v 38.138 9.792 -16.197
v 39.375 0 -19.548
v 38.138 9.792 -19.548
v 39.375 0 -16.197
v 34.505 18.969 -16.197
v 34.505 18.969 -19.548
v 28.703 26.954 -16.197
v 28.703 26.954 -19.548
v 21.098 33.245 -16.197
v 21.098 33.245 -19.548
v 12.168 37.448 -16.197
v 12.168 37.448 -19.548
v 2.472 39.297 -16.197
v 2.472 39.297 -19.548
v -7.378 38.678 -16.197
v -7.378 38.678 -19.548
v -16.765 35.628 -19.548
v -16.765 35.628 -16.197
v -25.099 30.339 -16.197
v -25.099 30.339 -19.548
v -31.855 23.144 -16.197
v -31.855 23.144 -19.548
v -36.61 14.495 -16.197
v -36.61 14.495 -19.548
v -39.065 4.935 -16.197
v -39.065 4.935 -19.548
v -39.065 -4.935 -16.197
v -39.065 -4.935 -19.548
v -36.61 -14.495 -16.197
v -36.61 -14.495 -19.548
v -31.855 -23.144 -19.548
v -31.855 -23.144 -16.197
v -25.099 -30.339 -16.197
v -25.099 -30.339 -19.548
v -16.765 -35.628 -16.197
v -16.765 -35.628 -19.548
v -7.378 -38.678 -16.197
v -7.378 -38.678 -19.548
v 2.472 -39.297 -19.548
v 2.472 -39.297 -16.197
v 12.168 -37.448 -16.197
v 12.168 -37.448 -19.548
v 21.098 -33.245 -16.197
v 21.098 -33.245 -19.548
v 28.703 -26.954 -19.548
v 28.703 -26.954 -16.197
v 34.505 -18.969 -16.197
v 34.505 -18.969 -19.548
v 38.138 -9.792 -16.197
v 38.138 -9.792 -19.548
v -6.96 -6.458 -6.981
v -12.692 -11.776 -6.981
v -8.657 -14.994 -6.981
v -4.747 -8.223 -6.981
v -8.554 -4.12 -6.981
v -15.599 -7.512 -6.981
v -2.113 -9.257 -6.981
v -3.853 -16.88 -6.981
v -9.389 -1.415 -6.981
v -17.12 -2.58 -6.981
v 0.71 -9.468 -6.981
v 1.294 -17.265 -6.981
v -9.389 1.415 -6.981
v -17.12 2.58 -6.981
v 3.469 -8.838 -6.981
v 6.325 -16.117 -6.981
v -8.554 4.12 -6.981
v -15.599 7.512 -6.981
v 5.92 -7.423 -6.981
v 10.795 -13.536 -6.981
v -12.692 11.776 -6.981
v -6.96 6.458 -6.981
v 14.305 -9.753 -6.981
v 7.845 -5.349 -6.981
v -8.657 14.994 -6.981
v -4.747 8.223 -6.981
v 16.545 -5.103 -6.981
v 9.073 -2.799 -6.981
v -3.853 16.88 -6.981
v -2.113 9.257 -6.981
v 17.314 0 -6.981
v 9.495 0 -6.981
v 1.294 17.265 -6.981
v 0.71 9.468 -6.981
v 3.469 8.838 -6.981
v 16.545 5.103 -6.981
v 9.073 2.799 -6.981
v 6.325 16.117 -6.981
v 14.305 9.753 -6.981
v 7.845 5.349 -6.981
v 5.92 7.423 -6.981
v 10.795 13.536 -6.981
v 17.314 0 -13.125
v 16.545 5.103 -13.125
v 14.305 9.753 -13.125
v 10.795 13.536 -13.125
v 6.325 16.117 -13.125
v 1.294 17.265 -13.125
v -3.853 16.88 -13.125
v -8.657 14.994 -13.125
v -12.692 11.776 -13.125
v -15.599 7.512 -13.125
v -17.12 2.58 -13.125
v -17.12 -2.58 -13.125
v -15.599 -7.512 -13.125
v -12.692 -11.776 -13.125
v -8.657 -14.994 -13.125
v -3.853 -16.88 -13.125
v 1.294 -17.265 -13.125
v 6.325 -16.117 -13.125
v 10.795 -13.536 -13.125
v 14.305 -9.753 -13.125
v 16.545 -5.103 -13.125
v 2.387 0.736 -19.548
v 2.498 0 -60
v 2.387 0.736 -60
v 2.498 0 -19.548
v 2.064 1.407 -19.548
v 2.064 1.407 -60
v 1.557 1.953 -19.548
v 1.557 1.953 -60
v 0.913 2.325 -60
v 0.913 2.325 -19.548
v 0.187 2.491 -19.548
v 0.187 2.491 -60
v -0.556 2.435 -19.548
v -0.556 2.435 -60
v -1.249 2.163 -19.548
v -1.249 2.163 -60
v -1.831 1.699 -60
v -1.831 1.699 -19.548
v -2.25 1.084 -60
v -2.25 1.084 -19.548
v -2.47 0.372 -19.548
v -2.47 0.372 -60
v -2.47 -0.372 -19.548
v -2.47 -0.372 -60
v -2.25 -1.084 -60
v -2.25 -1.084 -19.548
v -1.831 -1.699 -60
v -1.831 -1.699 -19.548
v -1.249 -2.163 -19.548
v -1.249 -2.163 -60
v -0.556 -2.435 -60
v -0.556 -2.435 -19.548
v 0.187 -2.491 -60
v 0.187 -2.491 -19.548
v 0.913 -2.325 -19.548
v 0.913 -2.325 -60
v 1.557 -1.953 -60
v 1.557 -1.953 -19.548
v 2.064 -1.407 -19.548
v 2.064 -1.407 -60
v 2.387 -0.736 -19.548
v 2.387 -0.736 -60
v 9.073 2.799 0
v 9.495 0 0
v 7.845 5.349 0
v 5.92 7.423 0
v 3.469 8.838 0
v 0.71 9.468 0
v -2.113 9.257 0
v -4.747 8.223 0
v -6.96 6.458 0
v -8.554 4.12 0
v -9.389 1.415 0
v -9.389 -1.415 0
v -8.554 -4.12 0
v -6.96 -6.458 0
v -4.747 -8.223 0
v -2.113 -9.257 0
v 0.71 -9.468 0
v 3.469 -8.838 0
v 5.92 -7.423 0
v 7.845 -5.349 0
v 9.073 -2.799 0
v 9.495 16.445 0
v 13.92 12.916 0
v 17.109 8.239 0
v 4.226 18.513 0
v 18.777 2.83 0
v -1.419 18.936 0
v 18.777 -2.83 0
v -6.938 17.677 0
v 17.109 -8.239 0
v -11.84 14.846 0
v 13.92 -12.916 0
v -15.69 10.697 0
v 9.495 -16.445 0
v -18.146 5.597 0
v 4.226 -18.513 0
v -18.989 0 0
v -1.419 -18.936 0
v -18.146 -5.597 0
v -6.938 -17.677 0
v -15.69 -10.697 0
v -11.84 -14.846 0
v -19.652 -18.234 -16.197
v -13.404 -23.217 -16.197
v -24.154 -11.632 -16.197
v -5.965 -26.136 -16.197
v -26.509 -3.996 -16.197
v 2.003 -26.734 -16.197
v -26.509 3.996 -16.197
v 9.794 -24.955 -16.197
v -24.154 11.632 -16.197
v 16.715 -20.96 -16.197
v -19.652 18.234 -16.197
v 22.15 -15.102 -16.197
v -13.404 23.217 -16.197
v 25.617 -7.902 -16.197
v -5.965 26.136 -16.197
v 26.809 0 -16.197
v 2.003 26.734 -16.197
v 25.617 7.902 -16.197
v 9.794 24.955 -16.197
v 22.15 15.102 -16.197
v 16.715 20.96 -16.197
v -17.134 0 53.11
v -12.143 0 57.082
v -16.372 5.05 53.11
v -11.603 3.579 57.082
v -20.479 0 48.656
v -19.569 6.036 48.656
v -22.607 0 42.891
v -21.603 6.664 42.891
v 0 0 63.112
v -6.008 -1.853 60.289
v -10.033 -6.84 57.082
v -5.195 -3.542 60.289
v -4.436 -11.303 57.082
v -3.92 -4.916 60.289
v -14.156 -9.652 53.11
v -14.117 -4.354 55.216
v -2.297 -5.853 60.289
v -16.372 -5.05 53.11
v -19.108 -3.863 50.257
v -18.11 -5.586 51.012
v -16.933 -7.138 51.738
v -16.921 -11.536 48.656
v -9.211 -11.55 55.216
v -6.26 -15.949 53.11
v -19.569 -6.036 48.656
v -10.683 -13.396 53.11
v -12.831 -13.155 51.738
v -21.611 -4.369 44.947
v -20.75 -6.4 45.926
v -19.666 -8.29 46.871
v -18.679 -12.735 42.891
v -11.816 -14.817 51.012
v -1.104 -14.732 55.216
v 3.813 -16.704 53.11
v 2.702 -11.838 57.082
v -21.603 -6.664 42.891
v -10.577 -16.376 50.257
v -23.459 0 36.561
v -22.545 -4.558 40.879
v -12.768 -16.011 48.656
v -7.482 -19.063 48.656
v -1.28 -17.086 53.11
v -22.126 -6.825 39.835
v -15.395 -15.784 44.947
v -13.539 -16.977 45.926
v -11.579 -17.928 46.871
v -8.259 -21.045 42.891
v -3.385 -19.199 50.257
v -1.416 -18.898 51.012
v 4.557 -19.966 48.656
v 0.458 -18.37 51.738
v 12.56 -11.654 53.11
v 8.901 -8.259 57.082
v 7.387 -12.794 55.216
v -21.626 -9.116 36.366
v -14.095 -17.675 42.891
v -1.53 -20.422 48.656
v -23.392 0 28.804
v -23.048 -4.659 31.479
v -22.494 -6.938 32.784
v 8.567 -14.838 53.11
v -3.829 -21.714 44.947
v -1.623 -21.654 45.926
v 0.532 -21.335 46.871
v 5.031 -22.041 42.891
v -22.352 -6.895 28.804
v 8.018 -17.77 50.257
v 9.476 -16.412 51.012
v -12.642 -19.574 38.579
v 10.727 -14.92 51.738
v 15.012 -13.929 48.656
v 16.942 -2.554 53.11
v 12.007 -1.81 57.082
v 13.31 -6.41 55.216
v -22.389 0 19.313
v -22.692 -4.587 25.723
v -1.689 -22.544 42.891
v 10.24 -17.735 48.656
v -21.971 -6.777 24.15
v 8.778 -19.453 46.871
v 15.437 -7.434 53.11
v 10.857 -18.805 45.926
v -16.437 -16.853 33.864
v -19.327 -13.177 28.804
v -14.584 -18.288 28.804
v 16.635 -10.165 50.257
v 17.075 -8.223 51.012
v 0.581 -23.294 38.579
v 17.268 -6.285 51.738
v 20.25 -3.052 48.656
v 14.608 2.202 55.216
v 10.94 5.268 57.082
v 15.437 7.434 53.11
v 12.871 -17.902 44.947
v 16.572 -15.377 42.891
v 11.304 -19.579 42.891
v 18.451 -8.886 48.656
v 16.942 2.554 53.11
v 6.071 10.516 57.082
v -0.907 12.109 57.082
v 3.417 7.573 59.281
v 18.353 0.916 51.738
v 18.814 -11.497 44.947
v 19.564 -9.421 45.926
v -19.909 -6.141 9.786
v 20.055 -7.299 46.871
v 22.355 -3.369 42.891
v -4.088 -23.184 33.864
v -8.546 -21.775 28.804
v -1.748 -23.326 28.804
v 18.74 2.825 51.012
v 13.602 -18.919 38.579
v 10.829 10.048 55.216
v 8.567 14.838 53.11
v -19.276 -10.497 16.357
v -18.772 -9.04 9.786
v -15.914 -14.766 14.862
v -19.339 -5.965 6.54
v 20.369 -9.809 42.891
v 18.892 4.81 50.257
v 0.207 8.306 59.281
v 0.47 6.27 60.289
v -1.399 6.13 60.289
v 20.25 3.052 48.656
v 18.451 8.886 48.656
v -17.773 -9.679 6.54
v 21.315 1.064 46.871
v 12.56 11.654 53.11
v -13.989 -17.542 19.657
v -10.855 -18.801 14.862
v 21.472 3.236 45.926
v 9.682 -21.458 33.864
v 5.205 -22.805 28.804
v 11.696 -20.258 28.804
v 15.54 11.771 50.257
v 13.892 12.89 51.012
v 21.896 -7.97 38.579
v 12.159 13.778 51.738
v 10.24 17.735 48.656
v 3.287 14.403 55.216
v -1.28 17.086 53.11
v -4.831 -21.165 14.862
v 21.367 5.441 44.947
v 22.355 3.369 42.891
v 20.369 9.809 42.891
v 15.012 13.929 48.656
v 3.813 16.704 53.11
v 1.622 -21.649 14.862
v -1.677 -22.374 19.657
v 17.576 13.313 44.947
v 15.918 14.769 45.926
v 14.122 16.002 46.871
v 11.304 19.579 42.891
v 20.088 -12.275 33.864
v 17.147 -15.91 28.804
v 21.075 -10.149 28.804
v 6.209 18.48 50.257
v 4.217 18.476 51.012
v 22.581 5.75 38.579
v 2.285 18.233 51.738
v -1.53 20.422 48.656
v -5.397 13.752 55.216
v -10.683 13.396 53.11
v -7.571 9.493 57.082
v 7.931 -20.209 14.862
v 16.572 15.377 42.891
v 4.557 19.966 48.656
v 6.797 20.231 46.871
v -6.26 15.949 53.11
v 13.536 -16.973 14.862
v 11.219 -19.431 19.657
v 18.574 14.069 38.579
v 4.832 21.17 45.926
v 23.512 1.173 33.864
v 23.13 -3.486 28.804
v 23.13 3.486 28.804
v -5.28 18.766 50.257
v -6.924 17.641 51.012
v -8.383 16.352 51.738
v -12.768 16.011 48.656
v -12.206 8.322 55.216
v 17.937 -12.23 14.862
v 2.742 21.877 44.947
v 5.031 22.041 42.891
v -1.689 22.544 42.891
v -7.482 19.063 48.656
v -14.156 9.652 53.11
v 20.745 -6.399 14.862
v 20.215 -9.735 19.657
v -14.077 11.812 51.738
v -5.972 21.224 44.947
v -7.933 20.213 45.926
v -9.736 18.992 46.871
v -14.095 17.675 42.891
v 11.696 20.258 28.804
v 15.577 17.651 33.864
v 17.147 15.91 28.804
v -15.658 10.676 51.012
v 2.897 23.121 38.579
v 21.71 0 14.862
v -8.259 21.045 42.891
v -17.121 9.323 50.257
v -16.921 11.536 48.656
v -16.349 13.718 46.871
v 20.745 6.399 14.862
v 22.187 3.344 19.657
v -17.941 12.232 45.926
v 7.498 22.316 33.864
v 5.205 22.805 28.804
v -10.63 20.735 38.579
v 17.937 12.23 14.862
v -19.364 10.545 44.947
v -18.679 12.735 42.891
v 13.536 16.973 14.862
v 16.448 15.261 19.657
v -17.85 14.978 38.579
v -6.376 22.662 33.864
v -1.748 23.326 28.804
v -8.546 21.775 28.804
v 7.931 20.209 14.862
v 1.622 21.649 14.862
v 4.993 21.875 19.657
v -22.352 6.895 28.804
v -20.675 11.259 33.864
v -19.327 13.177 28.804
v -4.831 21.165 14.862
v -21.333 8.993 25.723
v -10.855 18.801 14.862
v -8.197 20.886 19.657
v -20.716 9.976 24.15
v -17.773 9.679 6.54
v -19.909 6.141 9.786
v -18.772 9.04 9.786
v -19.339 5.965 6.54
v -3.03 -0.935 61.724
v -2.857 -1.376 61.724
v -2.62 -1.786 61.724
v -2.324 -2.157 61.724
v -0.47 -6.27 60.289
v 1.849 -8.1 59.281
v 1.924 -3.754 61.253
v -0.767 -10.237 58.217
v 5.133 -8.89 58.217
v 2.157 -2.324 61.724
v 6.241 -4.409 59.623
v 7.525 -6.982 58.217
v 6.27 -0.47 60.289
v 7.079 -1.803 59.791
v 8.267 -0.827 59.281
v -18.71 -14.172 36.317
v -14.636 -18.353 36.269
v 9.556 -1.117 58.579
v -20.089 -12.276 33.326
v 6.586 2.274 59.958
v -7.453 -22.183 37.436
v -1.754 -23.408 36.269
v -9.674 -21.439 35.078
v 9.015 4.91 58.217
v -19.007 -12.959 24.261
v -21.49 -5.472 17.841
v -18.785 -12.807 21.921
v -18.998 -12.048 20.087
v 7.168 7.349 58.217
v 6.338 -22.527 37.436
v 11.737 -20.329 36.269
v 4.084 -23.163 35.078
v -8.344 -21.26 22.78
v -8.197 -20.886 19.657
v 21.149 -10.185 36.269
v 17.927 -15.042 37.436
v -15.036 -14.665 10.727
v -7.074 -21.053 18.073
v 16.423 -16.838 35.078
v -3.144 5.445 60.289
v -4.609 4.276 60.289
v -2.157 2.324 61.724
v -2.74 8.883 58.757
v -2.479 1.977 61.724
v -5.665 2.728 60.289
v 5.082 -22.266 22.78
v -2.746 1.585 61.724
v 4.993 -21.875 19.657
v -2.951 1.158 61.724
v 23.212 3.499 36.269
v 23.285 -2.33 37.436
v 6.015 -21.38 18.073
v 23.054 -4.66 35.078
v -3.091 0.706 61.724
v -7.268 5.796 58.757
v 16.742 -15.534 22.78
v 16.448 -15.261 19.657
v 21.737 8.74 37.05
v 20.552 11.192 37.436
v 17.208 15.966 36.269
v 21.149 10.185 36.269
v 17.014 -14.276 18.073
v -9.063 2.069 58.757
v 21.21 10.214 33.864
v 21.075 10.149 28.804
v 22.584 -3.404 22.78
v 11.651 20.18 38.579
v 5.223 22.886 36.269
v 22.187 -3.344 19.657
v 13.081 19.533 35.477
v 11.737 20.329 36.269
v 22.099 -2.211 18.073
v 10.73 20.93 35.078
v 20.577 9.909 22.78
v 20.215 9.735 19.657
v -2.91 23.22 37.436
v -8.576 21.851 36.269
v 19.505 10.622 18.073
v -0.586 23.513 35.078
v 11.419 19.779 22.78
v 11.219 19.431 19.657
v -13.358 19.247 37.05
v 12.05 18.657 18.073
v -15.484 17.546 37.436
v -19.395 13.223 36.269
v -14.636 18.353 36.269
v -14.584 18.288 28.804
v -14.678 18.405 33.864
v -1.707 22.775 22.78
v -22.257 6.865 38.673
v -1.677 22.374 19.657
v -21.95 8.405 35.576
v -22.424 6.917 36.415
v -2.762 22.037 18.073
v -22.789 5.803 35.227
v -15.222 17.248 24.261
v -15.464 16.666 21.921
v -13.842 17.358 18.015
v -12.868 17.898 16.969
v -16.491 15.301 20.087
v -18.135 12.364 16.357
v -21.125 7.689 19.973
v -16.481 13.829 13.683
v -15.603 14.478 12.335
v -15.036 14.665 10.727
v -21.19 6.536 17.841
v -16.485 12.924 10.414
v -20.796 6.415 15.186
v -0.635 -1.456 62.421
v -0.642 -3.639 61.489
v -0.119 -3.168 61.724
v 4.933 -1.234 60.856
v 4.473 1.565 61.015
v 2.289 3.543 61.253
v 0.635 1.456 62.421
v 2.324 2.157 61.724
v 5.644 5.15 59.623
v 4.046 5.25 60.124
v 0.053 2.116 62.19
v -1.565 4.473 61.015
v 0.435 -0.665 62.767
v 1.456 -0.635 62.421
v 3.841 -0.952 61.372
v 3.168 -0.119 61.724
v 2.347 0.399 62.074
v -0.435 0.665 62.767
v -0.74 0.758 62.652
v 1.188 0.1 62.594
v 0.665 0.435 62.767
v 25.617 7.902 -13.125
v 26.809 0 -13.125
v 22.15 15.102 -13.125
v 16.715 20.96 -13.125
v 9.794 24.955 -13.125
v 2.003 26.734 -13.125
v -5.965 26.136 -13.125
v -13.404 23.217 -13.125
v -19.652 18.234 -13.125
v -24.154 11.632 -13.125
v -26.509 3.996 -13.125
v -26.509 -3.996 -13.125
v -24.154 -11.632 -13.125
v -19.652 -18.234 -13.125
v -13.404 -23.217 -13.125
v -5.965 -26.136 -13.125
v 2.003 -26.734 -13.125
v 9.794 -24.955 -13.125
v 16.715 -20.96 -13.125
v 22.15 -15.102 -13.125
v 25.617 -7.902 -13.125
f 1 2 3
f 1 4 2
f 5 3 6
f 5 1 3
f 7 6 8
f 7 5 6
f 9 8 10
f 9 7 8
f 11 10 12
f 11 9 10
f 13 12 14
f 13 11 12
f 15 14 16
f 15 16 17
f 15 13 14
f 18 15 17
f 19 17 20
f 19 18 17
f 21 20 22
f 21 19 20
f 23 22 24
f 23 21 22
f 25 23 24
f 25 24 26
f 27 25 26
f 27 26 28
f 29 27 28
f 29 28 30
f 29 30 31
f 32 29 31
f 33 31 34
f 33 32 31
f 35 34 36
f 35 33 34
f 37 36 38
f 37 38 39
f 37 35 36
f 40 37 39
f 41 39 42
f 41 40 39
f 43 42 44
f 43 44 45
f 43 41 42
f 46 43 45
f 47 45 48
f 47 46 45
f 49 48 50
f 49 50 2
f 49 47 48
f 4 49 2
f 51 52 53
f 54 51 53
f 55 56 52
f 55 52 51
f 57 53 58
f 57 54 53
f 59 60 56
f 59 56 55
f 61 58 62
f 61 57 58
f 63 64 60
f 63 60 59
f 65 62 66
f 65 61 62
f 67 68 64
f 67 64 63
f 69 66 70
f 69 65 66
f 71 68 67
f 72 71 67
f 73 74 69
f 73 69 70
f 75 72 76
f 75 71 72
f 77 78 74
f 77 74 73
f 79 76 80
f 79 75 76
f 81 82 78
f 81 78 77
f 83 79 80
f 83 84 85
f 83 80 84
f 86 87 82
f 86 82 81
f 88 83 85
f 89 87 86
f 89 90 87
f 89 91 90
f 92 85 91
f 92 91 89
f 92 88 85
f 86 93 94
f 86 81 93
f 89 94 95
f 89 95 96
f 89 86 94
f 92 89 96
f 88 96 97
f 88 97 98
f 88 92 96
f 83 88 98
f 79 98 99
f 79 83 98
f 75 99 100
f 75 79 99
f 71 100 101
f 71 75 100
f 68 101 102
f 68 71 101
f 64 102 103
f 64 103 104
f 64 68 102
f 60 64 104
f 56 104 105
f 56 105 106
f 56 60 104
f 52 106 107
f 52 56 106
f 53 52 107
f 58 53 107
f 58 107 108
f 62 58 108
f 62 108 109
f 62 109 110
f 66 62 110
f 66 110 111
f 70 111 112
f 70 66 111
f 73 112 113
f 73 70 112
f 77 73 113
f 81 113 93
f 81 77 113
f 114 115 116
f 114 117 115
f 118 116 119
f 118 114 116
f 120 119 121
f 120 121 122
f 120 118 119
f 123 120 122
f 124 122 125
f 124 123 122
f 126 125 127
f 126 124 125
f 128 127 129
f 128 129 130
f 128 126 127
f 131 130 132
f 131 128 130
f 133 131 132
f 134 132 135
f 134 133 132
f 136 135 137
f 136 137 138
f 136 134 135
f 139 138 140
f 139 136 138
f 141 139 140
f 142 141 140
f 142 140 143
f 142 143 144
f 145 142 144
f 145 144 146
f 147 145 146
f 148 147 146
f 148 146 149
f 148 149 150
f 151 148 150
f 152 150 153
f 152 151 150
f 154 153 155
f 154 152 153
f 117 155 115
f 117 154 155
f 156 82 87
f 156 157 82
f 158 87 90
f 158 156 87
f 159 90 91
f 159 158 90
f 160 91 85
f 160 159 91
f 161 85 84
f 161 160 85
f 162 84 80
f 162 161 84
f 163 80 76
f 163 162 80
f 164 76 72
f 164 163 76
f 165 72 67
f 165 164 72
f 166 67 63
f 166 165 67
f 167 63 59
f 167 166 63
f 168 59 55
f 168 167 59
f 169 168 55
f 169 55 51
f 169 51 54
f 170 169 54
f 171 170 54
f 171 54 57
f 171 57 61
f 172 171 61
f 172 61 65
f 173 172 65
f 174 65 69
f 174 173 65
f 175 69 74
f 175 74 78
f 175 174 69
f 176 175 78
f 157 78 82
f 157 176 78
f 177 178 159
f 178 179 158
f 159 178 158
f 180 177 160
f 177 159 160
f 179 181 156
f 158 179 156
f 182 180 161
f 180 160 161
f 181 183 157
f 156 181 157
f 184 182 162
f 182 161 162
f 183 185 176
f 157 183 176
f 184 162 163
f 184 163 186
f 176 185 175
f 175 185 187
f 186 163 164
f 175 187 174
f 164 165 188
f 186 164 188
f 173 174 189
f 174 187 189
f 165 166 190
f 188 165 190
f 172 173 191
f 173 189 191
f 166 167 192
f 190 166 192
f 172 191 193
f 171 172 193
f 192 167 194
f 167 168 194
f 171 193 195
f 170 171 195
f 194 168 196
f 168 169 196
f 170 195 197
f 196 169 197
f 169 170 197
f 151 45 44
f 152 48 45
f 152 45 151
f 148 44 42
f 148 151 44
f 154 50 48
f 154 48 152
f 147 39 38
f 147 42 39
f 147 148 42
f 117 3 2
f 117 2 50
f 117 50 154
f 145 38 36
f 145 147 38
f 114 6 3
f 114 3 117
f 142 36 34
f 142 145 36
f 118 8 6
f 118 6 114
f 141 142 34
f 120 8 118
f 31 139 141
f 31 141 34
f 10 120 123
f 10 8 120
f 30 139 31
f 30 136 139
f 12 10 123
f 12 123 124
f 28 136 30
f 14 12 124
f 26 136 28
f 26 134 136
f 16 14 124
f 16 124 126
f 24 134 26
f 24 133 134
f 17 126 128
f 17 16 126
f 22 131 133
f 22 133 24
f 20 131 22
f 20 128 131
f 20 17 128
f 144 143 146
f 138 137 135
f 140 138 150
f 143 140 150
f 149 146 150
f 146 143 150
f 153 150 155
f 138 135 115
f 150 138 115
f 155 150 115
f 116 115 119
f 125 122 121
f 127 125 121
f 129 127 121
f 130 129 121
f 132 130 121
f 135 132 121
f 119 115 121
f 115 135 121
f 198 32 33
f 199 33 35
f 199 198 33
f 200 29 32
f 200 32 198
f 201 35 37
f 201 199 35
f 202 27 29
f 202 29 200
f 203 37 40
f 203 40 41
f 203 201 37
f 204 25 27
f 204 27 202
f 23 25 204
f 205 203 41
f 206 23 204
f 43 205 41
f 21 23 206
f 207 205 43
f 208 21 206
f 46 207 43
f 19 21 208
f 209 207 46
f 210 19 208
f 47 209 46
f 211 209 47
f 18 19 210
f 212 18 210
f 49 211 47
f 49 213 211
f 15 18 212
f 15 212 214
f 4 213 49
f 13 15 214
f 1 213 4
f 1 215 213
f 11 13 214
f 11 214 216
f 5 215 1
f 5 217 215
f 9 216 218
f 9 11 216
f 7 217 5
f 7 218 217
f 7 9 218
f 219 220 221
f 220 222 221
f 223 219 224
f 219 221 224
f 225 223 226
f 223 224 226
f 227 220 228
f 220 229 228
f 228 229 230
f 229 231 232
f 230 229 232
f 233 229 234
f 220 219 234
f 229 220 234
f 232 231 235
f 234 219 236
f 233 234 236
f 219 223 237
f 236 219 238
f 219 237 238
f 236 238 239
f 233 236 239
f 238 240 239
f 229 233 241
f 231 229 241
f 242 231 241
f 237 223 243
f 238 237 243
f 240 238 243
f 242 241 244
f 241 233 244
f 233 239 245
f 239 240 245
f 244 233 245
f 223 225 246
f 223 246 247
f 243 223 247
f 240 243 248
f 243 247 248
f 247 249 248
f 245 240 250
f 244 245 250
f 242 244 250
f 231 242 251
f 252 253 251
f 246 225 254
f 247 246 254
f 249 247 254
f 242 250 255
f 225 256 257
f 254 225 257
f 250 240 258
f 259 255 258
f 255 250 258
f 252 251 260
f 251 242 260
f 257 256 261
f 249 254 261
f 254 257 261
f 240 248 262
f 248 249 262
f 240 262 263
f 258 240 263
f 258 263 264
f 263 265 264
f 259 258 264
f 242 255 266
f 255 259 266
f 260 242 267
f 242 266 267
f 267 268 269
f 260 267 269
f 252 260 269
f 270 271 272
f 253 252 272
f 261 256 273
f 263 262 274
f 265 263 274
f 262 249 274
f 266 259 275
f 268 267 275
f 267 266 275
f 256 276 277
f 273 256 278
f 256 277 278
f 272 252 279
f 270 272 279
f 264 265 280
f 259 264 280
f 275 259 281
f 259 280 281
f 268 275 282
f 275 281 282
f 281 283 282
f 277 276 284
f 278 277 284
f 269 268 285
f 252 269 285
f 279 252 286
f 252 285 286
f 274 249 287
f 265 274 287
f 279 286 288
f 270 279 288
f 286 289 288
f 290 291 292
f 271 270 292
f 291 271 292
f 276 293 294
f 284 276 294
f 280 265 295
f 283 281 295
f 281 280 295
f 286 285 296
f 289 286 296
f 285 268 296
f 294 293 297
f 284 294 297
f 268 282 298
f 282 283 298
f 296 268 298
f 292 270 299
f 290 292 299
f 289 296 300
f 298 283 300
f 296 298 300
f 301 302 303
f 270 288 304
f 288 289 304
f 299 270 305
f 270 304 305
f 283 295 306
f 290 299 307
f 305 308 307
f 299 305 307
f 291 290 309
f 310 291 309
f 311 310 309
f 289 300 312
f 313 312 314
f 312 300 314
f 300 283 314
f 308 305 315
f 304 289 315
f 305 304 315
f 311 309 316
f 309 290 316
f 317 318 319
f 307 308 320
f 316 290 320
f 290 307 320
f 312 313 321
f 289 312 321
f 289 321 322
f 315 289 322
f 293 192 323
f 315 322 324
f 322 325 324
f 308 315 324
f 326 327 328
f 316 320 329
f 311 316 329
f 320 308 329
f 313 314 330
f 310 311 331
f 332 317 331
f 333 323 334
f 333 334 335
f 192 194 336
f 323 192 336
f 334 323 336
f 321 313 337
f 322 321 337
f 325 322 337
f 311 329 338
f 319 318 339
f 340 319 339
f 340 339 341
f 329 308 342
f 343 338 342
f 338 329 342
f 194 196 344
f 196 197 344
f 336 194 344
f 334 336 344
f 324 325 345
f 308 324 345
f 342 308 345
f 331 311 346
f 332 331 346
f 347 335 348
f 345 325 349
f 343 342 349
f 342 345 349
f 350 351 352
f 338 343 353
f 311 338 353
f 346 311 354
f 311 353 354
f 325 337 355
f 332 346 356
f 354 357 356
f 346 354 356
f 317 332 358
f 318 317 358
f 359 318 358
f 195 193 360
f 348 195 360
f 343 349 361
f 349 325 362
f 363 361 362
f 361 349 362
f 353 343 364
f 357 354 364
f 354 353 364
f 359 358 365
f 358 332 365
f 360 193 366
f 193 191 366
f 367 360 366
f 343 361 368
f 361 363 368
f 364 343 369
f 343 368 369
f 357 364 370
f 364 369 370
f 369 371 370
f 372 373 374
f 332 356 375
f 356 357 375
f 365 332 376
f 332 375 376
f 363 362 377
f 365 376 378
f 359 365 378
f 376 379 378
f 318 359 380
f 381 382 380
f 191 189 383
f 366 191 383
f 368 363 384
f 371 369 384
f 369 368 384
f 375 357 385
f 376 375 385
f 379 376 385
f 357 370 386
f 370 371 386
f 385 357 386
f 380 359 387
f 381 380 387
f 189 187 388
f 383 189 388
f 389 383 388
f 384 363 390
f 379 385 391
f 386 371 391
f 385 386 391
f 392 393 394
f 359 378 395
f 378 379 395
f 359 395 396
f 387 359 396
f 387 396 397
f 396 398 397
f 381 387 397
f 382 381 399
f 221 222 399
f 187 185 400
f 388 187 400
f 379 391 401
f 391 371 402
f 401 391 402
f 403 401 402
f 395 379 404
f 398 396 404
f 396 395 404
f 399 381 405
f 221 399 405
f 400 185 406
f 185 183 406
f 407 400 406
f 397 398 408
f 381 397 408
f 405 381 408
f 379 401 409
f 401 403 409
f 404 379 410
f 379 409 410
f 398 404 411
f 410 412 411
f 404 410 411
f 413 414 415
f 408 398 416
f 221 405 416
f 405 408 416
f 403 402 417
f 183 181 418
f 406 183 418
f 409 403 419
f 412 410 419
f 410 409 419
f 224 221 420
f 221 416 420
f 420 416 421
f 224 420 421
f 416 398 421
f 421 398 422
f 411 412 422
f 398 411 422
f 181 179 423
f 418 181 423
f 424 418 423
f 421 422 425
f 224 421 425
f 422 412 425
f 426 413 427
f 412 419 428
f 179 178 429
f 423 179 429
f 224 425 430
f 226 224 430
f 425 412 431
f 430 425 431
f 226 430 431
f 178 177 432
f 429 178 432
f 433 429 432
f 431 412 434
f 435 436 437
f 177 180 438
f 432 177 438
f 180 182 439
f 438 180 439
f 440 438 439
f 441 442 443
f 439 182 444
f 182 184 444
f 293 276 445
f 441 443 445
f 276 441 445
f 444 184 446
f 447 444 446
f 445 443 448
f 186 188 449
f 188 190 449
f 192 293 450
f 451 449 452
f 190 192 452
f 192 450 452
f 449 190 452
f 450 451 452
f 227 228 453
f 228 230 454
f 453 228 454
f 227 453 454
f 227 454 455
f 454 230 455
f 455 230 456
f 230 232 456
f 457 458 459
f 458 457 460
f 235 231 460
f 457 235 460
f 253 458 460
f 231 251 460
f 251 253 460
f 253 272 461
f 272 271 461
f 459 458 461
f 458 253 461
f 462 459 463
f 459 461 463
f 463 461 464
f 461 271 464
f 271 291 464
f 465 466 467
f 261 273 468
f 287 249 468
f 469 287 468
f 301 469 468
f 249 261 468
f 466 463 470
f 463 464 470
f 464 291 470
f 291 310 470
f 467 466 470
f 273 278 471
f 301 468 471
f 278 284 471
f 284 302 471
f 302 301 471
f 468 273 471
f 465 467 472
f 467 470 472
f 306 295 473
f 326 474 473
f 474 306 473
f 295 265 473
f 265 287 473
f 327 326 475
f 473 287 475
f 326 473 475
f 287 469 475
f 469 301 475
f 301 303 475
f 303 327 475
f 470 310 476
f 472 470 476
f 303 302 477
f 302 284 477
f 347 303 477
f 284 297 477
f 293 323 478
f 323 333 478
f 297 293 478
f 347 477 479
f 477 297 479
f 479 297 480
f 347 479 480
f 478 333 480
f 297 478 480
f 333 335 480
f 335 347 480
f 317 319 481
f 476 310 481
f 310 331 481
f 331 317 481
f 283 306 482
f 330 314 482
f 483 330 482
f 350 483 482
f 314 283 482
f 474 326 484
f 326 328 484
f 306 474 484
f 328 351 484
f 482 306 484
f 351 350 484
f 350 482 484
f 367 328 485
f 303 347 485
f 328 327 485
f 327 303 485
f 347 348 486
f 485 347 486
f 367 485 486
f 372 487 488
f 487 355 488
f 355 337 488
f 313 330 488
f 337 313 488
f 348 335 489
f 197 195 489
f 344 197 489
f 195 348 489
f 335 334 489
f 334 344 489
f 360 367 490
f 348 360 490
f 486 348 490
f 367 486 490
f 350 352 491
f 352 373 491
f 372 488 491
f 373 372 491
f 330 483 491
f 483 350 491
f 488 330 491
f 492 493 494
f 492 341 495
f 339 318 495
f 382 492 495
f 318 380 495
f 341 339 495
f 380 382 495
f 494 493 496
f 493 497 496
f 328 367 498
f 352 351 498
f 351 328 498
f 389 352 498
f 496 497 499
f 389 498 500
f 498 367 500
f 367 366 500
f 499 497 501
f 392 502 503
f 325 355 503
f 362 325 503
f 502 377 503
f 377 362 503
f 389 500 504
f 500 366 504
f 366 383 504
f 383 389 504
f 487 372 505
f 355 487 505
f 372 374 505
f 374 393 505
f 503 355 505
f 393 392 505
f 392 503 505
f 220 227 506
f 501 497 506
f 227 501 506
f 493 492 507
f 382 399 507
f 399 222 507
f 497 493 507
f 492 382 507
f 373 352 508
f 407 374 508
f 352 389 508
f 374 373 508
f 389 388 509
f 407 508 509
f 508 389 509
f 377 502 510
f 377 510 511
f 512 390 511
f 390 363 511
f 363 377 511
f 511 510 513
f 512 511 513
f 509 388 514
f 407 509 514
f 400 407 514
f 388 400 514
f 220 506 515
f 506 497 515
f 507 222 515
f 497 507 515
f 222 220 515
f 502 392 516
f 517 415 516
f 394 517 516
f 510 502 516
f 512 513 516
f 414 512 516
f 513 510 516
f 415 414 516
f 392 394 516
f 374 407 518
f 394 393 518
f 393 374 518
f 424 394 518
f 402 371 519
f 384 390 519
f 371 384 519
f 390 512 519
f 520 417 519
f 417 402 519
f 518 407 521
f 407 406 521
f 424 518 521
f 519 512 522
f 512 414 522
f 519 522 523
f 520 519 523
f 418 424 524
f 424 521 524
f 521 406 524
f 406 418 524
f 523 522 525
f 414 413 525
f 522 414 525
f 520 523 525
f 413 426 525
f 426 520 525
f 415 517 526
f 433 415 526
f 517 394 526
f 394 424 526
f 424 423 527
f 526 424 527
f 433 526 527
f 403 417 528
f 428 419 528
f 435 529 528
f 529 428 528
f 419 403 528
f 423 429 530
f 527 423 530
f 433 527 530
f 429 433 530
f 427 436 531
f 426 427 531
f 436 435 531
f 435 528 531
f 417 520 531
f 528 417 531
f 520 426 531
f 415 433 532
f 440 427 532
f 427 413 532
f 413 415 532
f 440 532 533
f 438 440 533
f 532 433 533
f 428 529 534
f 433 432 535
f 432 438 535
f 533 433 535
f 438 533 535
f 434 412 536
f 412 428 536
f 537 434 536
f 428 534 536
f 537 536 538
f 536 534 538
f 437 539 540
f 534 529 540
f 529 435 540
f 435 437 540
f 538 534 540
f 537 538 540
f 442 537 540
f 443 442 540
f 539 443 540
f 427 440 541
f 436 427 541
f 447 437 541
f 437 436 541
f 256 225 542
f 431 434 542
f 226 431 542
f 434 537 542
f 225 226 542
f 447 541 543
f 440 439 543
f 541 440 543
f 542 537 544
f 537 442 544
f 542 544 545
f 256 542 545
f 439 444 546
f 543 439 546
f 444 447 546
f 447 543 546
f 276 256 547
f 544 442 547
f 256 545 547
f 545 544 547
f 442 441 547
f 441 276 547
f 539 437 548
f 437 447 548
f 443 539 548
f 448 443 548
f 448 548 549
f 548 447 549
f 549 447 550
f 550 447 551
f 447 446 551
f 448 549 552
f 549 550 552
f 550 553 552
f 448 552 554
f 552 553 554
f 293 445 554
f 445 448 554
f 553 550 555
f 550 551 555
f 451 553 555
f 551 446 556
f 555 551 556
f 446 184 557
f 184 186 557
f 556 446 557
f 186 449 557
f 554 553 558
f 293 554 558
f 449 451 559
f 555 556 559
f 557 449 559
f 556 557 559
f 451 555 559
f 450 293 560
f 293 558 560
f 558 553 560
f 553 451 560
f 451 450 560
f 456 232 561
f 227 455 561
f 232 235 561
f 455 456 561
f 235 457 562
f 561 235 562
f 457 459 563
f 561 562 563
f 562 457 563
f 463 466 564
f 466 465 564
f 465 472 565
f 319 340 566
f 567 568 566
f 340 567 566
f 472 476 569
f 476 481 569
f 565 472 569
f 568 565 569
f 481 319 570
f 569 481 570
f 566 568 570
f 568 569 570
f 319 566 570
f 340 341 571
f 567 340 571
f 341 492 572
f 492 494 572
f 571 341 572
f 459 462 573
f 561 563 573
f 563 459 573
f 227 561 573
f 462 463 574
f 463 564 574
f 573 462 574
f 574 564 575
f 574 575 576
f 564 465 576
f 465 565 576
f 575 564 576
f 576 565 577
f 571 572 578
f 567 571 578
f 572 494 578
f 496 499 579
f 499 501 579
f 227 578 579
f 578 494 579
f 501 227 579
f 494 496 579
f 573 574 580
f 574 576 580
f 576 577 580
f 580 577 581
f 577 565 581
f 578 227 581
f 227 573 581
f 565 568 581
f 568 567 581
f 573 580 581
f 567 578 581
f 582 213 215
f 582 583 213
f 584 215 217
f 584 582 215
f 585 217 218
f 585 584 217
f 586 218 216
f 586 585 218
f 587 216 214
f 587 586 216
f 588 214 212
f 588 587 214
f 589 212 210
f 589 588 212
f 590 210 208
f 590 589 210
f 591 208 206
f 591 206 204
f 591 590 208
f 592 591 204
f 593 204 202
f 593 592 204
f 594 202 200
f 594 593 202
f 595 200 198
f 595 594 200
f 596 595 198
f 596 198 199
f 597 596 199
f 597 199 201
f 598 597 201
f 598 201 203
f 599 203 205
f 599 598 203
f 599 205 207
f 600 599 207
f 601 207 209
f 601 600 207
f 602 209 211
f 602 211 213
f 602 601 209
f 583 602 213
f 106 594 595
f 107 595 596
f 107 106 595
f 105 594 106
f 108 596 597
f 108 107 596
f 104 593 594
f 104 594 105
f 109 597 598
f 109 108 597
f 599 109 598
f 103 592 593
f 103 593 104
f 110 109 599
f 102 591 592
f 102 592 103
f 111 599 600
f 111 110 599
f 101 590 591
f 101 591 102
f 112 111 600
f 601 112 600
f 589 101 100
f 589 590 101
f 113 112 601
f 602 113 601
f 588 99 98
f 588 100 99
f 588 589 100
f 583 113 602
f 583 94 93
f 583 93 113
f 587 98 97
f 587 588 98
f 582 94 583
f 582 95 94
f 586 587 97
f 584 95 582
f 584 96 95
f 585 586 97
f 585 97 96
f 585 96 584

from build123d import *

# Parameters (mm, degrees)
F0_R     = 2.4977360004
F1_DEPTH = 60


with BuildPart() as f1:
    # F0 (on Top) → F1 (new body, symmetric)
    with BuildSketch(Plane.XY):
        Circle(F0_R)
    extrude(amount=F1_DEPTH, both=True)

    # F2 (on Front) → F3 (revolve)
    with BuildSketch(Plane.XZ):
        with BuildLine():
            Line((0, 0), (0, 63.1117001176))
            add(Edge.make_bspline(
                [(0, 63.1117001176), (-8.564592389, 59.3954542786), (-28.7472157674, 50.6380509202), (-22.5542900222, 18.5000735529), (-18.9893618226, 0)],
                knots=[0, 0, 0, 0, 0.4243547644, 1, 1, 1, 1], degree=3))
            Line((-18.9893618226, 0), (0, 0))
        make_face()
    revolve(axis=Axis((0, 0, 31.5558500588), (0, 0, 1)))

    # F4 (on Front) → F5 (revolve)
    with BuildSketch(Plane.XZ):
        Polygon((9.49467998, 0), (0, 0), (0, -19.547874108), (39.3750034273, -19.547874108), (39.3750034273, -16.1968097091), (26.8085133284, -16.1968097091), (26.8085133284, -13.1250005215), (17.3138324171, -13.1250005215), (17.3138324171, -6.9813835435), (9.49467998, -6.9813835435), align=None)
    revolve(axis=Axis((0, 0, -9.773937054), (0, 0, 1)))


solid = f1.part
